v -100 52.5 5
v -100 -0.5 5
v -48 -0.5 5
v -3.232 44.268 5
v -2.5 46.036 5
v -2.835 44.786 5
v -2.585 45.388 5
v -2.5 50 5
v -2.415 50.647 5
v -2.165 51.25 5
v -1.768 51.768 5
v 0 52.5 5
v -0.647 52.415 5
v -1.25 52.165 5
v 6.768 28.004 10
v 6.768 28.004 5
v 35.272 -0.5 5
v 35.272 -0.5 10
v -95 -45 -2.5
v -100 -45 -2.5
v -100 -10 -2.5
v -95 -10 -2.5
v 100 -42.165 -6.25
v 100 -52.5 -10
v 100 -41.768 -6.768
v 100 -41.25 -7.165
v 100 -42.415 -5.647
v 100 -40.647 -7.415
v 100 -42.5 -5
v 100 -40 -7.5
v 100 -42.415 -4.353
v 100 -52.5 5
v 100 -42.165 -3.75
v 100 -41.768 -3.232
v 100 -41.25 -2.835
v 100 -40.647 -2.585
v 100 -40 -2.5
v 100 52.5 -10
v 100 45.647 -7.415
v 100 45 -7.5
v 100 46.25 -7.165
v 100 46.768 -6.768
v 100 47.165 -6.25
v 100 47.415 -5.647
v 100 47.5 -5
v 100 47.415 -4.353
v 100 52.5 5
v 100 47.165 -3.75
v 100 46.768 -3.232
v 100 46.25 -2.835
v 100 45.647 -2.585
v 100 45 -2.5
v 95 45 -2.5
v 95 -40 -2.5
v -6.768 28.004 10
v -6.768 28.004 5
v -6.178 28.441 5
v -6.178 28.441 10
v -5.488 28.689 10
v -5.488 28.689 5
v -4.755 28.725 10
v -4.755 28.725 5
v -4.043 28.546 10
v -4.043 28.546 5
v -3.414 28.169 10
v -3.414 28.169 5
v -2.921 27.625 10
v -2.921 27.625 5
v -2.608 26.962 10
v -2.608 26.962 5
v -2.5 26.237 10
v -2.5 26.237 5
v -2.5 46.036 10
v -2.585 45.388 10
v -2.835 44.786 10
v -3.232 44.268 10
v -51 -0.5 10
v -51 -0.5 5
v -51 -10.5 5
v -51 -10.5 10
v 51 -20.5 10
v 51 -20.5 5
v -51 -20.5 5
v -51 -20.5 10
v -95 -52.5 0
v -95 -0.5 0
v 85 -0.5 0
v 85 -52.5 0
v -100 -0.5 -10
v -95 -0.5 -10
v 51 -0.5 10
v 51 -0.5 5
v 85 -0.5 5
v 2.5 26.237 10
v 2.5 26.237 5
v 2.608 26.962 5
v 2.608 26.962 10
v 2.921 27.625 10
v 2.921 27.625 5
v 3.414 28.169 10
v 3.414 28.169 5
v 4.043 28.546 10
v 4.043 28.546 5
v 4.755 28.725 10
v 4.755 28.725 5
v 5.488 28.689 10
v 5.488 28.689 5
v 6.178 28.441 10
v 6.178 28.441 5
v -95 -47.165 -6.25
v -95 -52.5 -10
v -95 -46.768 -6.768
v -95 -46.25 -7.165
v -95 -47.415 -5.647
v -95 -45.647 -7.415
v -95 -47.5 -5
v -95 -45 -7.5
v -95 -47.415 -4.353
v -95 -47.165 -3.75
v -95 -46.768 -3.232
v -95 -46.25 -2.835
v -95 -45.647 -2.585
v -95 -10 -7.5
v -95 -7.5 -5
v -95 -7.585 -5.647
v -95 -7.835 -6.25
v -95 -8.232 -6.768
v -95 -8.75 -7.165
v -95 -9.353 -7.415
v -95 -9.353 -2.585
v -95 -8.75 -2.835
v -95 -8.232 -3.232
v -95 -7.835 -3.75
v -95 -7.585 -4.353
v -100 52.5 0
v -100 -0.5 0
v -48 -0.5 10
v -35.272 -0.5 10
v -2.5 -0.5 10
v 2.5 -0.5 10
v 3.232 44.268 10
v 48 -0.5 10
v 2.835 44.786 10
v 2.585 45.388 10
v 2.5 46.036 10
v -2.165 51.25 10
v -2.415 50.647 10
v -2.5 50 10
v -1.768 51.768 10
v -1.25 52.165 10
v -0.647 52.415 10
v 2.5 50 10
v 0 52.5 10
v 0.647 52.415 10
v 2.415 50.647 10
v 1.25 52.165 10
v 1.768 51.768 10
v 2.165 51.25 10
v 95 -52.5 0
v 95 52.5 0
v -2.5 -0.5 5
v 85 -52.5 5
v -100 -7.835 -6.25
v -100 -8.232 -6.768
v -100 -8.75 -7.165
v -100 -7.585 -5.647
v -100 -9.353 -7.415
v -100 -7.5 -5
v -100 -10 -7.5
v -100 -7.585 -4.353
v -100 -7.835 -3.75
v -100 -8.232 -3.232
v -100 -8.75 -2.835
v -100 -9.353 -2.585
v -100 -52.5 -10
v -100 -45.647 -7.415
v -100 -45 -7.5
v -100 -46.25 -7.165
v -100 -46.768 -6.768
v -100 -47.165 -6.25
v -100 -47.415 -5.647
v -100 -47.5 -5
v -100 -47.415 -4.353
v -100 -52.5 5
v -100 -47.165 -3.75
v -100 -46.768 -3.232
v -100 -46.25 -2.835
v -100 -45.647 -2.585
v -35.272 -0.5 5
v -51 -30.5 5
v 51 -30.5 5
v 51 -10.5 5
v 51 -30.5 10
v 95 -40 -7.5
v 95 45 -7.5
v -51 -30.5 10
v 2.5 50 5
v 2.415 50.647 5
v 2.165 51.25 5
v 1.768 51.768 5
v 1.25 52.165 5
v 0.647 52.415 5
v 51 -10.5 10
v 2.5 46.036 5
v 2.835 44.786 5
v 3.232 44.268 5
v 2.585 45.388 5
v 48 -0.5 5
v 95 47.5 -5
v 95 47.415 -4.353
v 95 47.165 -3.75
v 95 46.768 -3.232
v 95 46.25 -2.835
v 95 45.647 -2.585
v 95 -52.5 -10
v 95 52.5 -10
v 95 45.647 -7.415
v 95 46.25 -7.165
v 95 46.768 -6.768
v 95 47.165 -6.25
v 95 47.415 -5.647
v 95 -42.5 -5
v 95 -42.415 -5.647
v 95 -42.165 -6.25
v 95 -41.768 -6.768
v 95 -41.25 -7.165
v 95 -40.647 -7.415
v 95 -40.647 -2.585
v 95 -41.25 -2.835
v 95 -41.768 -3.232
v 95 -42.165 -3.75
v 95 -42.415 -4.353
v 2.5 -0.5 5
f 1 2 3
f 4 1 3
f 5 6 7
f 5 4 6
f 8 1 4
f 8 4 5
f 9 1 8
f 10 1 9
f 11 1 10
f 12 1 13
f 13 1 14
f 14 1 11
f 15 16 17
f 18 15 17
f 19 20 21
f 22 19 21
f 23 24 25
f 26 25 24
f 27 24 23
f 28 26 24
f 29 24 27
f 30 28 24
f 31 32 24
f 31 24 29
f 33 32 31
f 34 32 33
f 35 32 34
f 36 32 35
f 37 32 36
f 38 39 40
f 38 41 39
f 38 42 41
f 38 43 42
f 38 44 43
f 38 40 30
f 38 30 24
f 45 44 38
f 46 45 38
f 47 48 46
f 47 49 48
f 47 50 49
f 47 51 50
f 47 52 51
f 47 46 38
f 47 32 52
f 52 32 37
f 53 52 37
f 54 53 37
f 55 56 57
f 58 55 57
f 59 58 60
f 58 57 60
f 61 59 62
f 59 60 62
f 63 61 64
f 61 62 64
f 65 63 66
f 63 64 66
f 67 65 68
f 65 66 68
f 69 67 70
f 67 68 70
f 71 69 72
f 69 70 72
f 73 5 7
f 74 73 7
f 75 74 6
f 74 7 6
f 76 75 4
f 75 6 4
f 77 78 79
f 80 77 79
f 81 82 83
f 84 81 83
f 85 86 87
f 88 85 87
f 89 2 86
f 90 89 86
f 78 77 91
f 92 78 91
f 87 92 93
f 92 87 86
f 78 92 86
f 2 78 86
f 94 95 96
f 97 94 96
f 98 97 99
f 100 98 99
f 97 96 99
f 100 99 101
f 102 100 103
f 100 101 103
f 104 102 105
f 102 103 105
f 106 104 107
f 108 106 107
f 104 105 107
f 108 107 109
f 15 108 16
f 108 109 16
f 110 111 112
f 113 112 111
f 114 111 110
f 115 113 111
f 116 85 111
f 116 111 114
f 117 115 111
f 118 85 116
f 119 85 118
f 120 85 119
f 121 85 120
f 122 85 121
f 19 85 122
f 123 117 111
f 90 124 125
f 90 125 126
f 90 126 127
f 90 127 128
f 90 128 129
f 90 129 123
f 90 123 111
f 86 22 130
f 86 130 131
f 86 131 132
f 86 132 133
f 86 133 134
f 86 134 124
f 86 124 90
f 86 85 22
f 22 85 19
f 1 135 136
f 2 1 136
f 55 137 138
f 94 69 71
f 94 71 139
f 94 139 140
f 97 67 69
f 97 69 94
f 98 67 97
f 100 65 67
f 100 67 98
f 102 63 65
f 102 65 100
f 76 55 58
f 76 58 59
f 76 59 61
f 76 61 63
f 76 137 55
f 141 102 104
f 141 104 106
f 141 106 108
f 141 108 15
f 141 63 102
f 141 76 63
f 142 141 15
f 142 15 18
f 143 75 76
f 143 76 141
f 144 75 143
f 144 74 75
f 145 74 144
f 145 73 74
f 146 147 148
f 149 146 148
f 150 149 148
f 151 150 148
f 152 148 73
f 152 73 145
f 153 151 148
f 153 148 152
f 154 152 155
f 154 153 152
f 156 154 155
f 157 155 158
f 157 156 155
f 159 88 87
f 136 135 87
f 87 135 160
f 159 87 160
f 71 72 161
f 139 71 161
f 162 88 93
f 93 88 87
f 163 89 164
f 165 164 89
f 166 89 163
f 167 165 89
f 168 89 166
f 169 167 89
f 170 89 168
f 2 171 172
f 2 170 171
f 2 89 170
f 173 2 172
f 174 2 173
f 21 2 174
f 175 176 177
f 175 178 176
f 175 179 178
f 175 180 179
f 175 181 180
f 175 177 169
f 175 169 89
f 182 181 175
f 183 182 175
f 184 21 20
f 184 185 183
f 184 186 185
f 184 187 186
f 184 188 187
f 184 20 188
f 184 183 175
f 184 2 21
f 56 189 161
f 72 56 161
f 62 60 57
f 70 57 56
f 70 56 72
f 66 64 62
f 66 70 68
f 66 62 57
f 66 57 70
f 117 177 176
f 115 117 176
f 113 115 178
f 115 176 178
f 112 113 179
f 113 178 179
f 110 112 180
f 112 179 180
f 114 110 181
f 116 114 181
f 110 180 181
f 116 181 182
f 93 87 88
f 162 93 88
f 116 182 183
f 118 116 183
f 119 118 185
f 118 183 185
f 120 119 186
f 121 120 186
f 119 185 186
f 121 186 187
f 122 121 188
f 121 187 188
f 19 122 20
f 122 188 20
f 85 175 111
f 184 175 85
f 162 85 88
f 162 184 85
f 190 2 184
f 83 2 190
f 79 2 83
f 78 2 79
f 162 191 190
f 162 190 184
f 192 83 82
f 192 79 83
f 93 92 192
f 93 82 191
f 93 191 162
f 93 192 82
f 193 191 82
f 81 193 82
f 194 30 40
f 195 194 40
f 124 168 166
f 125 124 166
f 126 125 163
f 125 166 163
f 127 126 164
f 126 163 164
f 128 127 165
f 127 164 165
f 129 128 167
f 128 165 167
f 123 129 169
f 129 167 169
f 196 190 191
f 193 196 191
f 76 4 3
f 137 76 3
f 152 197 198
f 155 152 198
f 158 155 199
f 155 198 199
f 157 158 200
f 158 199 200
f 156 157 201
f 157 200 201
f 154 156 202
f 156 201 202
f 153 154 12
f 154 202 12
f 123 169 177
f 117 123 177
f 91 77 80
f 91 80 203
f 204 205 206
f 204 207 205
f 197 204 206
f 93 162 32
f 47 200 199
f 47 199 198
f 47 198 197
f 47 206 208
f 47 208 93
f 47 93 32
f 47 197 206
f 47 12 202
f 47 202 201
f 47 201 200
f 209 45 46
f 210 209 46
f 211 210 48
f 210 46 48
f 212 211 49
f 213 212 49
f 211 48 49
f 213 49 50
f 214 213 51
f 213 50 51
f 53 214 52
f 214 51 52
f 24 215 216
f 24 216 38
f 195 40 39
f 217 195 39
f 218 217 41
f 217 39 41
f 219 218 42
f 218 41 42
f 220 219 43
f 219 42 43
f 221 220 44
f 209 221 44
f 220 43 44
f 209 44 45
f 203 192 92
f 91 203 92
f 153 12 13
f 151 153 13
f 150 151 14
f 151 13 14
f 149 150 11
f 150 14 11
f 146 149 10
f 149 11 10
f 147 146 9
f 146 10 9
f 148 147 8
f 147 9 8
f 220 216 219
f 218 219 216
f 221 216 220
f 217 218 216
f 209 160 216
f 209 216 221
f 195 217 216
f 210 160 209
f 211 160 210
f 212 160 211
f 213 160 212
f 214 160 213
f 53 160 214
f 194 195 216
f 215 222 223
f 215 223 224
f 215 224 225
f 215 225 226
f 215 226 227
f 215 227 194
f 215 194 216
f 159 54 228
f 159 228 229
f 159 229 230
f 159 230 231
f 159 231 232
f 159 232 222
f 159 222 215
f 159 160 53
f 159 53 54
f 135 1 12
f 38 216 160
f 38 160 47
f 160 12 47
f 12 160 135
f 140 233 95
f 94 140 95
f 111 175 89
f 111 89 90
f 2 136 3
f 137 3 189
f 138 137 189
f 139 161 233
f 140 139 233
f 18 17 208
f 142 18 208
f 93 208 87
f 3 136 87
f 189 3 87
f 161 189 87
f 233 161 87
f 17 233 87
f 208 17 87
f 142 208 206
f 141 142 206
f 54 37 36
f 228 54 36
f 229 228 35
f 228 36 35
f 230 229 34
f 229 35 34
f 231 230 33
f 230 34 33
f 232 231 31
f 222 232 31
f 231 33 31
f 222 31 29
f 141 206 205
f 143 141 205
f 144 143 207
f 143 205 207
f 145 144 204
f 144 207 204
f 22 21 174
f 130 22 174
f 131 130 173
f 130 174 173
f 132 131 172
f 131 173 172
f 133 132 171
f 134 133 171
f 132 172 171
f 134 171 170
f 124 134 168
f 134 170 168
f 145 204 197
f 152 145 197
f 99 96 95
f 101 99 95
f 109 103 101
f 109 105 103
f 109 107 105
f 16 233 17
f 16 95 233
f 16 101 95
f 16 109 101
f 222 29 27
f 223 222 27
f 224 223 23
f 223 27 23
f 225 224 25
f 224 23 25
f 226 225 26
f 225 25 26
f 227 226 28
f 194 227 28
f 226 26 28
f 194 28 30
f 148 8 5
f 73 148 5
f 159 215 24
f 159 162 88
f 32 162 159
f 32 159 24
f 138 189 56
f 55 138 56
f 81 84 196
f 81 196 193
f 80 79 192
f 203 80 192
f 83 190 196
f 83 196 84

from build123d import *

# Parameters (mm, degrees)
F0_W      = 5
F0_H      = 53
F0_W_2    = 10
F0_H_2    = 10
F1_DEPTH  = 5
F2_DEPTH  = 10
F3_DEPTH  = 10
F0_W_3    = 48.5
F4_DEPTH  = 5
F5_DEPTH  = 10
F6_DEPTH  = 10
F8_DEPTH  = 25
F10_DEPTH = 25


with BuildPart() as f1:
    # F0 (on Top) → F1 (new body)
    with BuildSketch(Plane.XY):
        with Locations((97.5, 26)):
            Rectangle(F0_W, F0_H)
        with BuildLine():
            Line((0, 52.5), (-100, 52.5))
            Line((-100, 52.5), (-100, -0.5))
            Line((-100, -0.5), (-95, -0.5))
            Line((-95, -0.5), (-51, -0.5))
            Line((-51, -0.5), (-48, -0.5))
            Line((-48, -0.5), (-3.232233047, 44.267766953))
            ThreePointArc((-3.232233047, 44.267766953), (-2.6903011687, 45.078825325), (-2.5, 46.0355339059))
            Line((-2.5, 46.0355339059), (-2.5, 50))
            ThreePointArc((-2.5, 50), (-1.767766953, 51.767766953), (0, 52.5))
        make_face()
        with BuildLine():
            Line((85, 52.5), (0, 52.5))
            ThreePointArc((0, 52.5), (1.767766953, 51.767766953), (2.5, 50))
            Line((2.5, 50), (2.5, 46.0355339059))
            ThreePointArc((2.5, 46.0355339059), (2.6903011687, 45.078825325), (3.232233047, 44.267766953))
            Line((3.232233047, 44.267766953), (48, -0.5))
            Line((48, -0.5), (51, -0.5))
            Line((51, -0.5), (85, -0.5))
            Line((85, -0.5), (85, 52.5))
        make_face()
        with BuildLine():
            ThreePointArc((2.5, 50), (1.767766953, 51.767766953), (0, 52.5))
            ThreePointArc((0, 52.5), (-1.767766953, 51.767766953), (-2.5, 50))
            Line((-2.5, 50), (-2.5, 46.0355339059))
            Line((-2.5, 46.0355339059), (-2.5, 32.2720779386))
            Line((-2.5, 32.2720779386), (-2.5, 26.2365440327))
            Line((-2.5, 26.2365440327), (-2.5, 0))
            Line((-2.5, 0), (-2.5, -0.5))
            Line((-2.5, -0.5), (2.5, -0.5))
            Line((2.5, -0.5), (2.5, 26.2365440327))
            Line((2.5, 26.2365440327), (2.5, 46.0355339059))
            Line((2.5, 46.0355339059), (2.5, 50))
        make_face()
        with BuildLine():
            Line((-2.5, 32.2720779386), (-2.5, 46.0355339059))
            ThreePointArc((-2.5, 46.0355339059), (-2.6903011687, 45.078825325), (-3.232233047, 44.267766953))
            Line((-3.232233047, 44.267766953), (-48, -0.5))
            Line((-48, -0.5), (-35.2720779386, -0.5))
            Line((-35.2720779386, -0.5), (-6.767766953, 28.0043109857))
            ThreePointArc((-6.767766953, 28.0043109857), (-4.0432914191, 28.546242864), (-2.5, 26.2365440327))
            Line((-2.5, 26.2365440327), (-2.5, 32.2720779386))
        make_face()
        with BuildLine():
            Line((-2.5, 0), (-2.5, 26.2365440327))
            ThreePointArc((-2.5, 26.2365440327), (-4.0432914191, 28.546242864), (-6.767766953, 28.0043109857))
            Line((-6.767766953, 28.0043109857), (-35.2720779386, -0.5))
            Line((-35.2720779386, -0.5), (-2.5, -0.5))
            Line((-2.5, -0.5), (-2.5, 0))
        make_face()
        with BuildLine():
            ThreePointArc((6.767766953, 28.0043109857), (4.0432914191, 28.546242864), (2.5, 26.2365440327))
            Line((2.5, 26.2365440327), (2.5, -0.5))
            Line((2.5, -0.5), (35.2720779386, -0.5))
            Line((35.2720779386, -0.5), (6.767766953, 28.0043109857))
        make_face()
        with BuildLine():
            ThreePointArc((3.232233047, 44.267766953), (2.6903011687, 45.078825325), (2.5, 46.0355339059))
            Line((2.5, 46.0355339059), (2.5, 26.2365440327))
            ThreePointArc((2.5, 26.2365440327), (4.0432914191, 28.546242864), (6.767766953, 28.0043109857))
            Line((6.767766953, 28.0043109857), (35.2720779386, -0.5))
            Line((35.2720779386, -0.5), (48, -0.5))
            Line((48, -0.5), (3.232233047, 44.267766953))
        make_face()
        with Locations((90, 26)):
            Rectangle(F0_W_2, F0_H)
        with Locations((90, -5.5)):
            Rectangle(F0_W_2, F0_H_2)
        with Locations((90, -15.5)):
            Rectangle(F0_W_2, F0_H_2)
        with Locations((90, -25.5)):
            Rectangle(F0_W_2, F0_H_2)
        with Locations((97.5, -25.5)):
            Rectangle(F0_W, F0_H_2)
        with Locations((97.5, -15.5)):
            Rectangle(F0_W, F0_H_2)
        with Locations((97.5, -5.5)):
            Rectangle(F0_W, F0_H_2)
        Polygon((95, -30.5), (85, -30.5), (85, -37.5), (95, -47.5), align=None)
        with BuildLine():
            Line((100, -30.5), (95, -30.5))
            Line((95, -30.5), (95, -47.5))
            Line((95, -47.5), (95.732233047, -48.232233047))
            ThreePointArc((95.732233047, -48.232233047), (96.4244505146, -50.4455071839), (95, -52.2754493028))
            Line((95, -52.2754493028), (95, -52.5))
            Line((95, -52.5), (100, -52.5))
            Line((100, -52.5), (100, -30.5))
        make_face()
        with BuildLine():
            Line((95, -47.5), (85, -37.5))
            Line((85, -37.5), (85, -50.2279220614))
            Line((85, -50.2279220614), (86.5398448916, -51.767766953))
            ThreePointArc((86.5398448916, -51.767766953), (87.3509032637, -52.3096988313), (88.3076118446, -52.5))
            Line((88.3076118446, -52.5), (93.9644660941, -52.5))
            ThreePointArc((93.9644660941, -52.5), (94.4942664069, -52.4432174747), (95, -52.2754493028))
            Line((95, -52.2754493028), (95, -47.5))
        make_face()
        with BuildLine():
            Line((86.5398448916, -51.767766953), (85, -50.2279220614))
            Line((85, -50.2279220614), (85, -52.5))
            Line((85, -52.5), (88.3076118446, -52.5))
            ThreePointArc((88.3076118446, -52.5), (87.3509032637, -52.3096988313), (86.5398448916, -51.767766953))
        make_face()
        with BuildLine():
            Line((95.732233047, -48.232233047), (95, -47.5))
            Line((95, -47.5), (95, -52.2754493028))
            ThreePointArc((95, -52.2754493028), (96.4244505146, -50.4455071839), (95.732233047, -48.232233047))
        make_face()
        with BuildLine():
            Line((95, -52.5), (95, -52.2754493028))
            ThreePointArc((95, -52.2754493028), (94.4942664069, -52.4432174747), (93.9644660941, -52.5))
            Line((93.9644660941, -52.5), (95, -52.5))
        make_face()
    extrude(amount=F1_DEPTH)

    # F0 (on Top) → F2 (join)
    with BuildSketch(Plane.XY):
        with BuildLine():
            ThreePointArc((2.5, 50), (1.767766953, 51.767766953), (0, 52.5))
            ThreePointArc((0, 52.5), (-1.767766953, 51.767766953), (-2.5, 50))
            Line((-2.5, 50), (-2.5, 46.0355339059))
            Line((-2.5, 46.0355339059), (-2.5, 32.2720779386))
            Line((-2.5, 32.2720779386), (-2.5, 26.2365440327))
            Line((-2.5, 26.2365440327), (-2.5, 0))
            Line((-2.5, 0), (-2.5, -0.5))
            Line((-2.5, -0.5), (2.5, -0.5))
            Line((2.5, -0.5), (2.5, 26.2365440327))
            Line((2.5, 26.2365440327), (2.5, 46.0355339059))
            Line((2.5, 46.0355339059), (2.5, 50))
        make_face()
        with BuildLine():
            Line((-2.5, 32.2720779386), (-2.5, 46.0355339059))
            ThreePointArc((-2.5, 46.0355339059), (-2.6903011687, 45.078825325), (-3.232233047, 44.267766953))
            Line((-3.232233047, 44.267766953), (-48, -0.5))
            Line((-48, -0.5), (-35.2720779386, -0.5))
            Line((-35.2720779386, -0.5), (-6.767766953, 28.0043109857))
            ThreePointArc((-6.767766953, 28.0043109857), (-4.0432914191, 28.546242864), (-2.5, 26.2365440327))
            Line((-2.5, 26.2365440327), (-2.5, 32.2720779386))
        make_face()
        with BuildLine():
            ThreePointArc((3.232233047, 44.267766953), (2.6903011687, 45.078825325), (2.5, 46.0355339059))
            Line((2.5, 46.0355339059), (2.5, 26.2365440327))
            ThreePointArc((2.5, 26.2365440327), (4.0432914191, 28.546242864), (6.767766953, 28.0043109857))
            Line((6.767766953, 28.0043109857), (35.2720779386, -0.5))
            Line((35.2720779386, -0.5), (48, -0.5))
            Line((48, -0.5), (3.232233047, 44.267766953))
        make_face()
    extrude(amount=F2_DEPTH)

    # F0 (on Top) → F3 (join)
    with BuildSketch(Plane.XY):
        with Locations((97.5, 26)):
            Rectangle(F0_W, F0_H)
        with Locations((97.5, -5.5)):
            Rectangle(F0_W, F0_H_2)
        with Locations((97.5, -15.5)):
            Rectangle(F0_W, F0_H_2)
        with Locations((97.5, -25.5)):
            Rectangle(F0_W, F0_H_2)
        with BuildLine():
            Line((100, -30.5), (95, -30.5))
            Line((95, -30.5), (95, -47.5))
            Line((95, -47.5), (95.732233047, -48.232233047))
            ThreePointArc((95.732233047, -48.232233047), (96.4244505146, -50.4455071839), (95, -52.2754493028))
            Line((95, -52.2754493028), (95, -52.5))
            Line((95, -52.5), (100, -52.5))
            Line((100, -52.5), (100, -30.5))
        make_face()
        with BuildLine():
            Line((95.732233047, -48.232233047), (95, -47.5))
            Line((95, -47.5), (95, -52.2754493028))
            ThreePointArc((95, -52.2754493028), (96.4244505146, -50.4455071839), (95.732233047, -48.232233047))
        make_face()
    extrude(amount=-F3_DEPTH)

    # F7 (on face) → F8 (cut)
    with BuildSketch(Plane.YZ.offset(100)):
        with BuildLine():
            Line((45, -2.5), (-40, -2.5))
            ThreePointArc((-40, -2.5), (-41.767766953, -3.232233047), (-42.5, -5))
            ThreePointArc((-42.5, -5), (-41.767766953, -6.767766953), (-40, -7.5))
            Line((-40, -7.5), (45, -7.5))
            ThreePointArc((45, -7.5), (46.767766953, -6.767766953), (47.5, -5))
            ThreePointArc((47.5, -5), (46.767766953, -3.232233047), (45, -2.5))
        make_face()
    extrude(amount=-F8_DEPTH, mode=Mode.SUBTRACT)


with BuildPart() as f4:
    # F0 (on Top) → F4 (new body)
    with BuildSketch(Plane.XY):
        with Locations((-97.5, -25.5)):
            Rectangle(F0_W, F0_H_2)
        Polygon((-68, -20.5), (-95, -20.5), (-95, -30.5), (-78, -30.5), align=None)
        with Locations((-97.5, -15.5)):
            Rectangle(F0_W, F0_H_2)
        with Locations((-97.5, -5.5)):
            Rectangle(F0_W, F0_H_2)
        Polygon((-51, -0.5), (-95, -0.5), (-95, -10.5), (-58, -10.5), (-51, -3.5), align=None)
        Polygon((-58, -10.5), (-95, -10.5), (-95, -20.5), (-68, -20.5), align=None)
        Polygon((-55.2720779386, -20.5), (-68, -20.5), (-78, -30.5), (-65.2720779386, -30.5), align=None)
        Polygon((-51, -10.5), (-58, -10.5), (-68, -20.5), (-55.2720779386, -20.5), (-45.2720779386, -10.5), align=None)
        Polygon((-35.2720779386, -0.5), (-48, -0.5), (-51, -3.5), (-51, -10.5), (-45.2720779386, -10.5), align=None)
        Polygon((-51, -3.5), (-58, -10.5), (-51, -10.5), align=None)
        Polygon((-48, -0.5), (-51, -0.5), (-51, -3.5), align=None)
        Polygon((-2.5, -0.5), (-35.2720779386, -0.5), (-45.2720779386, -10.5), (-2.5, -10.5), align=None)
        Polygon((-45.2720779386, -10.5), (-55.2720779386, -20.5), (-51, -20.5), (-2.5, -20.5), (-2.5, -10.5), align=None)
        Polygon((-51, -20.5), (-55.2720779386, -20.5), (-65.2720779386, -30.5), (-51, -30.5), align=None)
        with Locations((-26.75, -25.5)):
            Rectangle(F0_W_3, F0_H_2)
        with Locations((0, -5.5)):
            Rectangle(F0_W, F0_H_2)
        with Locations((0, -15.5)):
            Rectangle(F0_W, F0_H_2)
        with Locations((0, -25.5)):
            Rectangle(F0_W, F0_H_2)
        Polygon((45.2720779386, -10.5), (2.5, -10.5), (2.5, -20.5), (51, -20.5), (55.2720779386, -20.5), align=None)
        Polygon((35.2720779386, -0.5), (2.5, -0.5), (2.5, -10.5), (45.2720779386, -10.5), align=None)
        Polygon((65.2720779386, -30.5), (55.2720779386, -20.5), (51, -20.5), (51, -30.5), align=None)
        Polygon((78, -30.5), (68, -20.5), (55.2720779386, -20.5), (65.2720779386, -30.5), align=None)
        Polygon((68, -20.5), (58, -10.5), (51, -10.5), (45.2720779386, -10.5), (55.2720779386, -20.5), align=None)
        with Locations((26.75, -25.5)):
            Rectangle(F0_W_3, F0_H_2)
        Polygon((51, -3.5), (48, -0.5), (35.2720779386, -0.5), (45.2720779386, -10.5), (51, -10.5), align=None)
        Polygon((51, -3.5), (51, -0.5), (48, -0.5), align=None)
        Polygon((58, -10.5), (51, -3.5), (51, -10.5), align=None)
        Polygon((85, -30.5), (85, -20.5), (68, -20.5), (78, -30.5), align=None)
        Polygon((85, -20.5), (85, -10.5), (58, -10.5), (68, -20.5), align=None)
        Polygon((85, -10.5), (85, -0.5), (51, -0.5), (51, -3.5), (58, -10.5), align=None)
        Polygon((85, -37.5), (85, -30.5), (78, -30.5), align=None)
        Polygon((85, -37.5), (78, -30.5), (65.2720779386, -30.5), (85, -50.2279220614), align=None)
        with BuildLine():
            Line((85, -50.2279220614), (65.2720779386, -30.5))
            Line((65.2720779386, -30.5), (51, -30.5))
            Line((51, -30.5), (2.5, -30.5))
            Line((2.5, -30.5), (2.5, -50))
            ThreePointArc((2.5, -50), (1.767766953, -51.767766953), (0, -52.5))
            Line((0, -52.5), (85, -52.5))
            Line((85, -52.5), (85, -50.2279220614))
        make_face()
        with BuildLine():
            Line((2.5, -50), (2.5, -30.5))
            Line((2.5, -30.5), (-2.5, -30.5))
            Line((-2.5, -30.5), (-2.5, -50))
            ThreePointArc((-2.5, -50), (-1.767766953, -51.767766953), (0, -52.5))
            ThreePointArc((0, -52.5), (1.767766953, -51.767766953), (2.5, -50))
        make_face()
        with BuildLine():
            Line((-51, -30.5), (-65.2720779386, -30.5))
            Line((-65.2720779386, -30.5), (-86.5398448916, -51.767766953))
            ThreePointArc((-86.5398448916, -51.767766953), (-87.3509032637, -52.3096988313), (-88.3076118446, -52.5))
            Line((-88.3076118446, -52.5), (0, -52.5))
            ThreePointArc((0, -52.5), (-1.767766953, -51.767766953), (-2.5, -50))
            Line((-2.5, -50), (-2.5, -30.5))
            Line((-2.5, -30.5), (-51, -30.5))
        make_face()
        with BuildLine():
            Line((-65.2720779386, -30.5), (-78, -30.5))
            Line((-78, -30.5), (-95, -47.5))
            Line((-95, -47.5), (-95, -52.2754493028))
            ThreePointArc((-95, -52.2754493028), (-94.4942664069, -52.4432174747), (-93.9644660941, -52.5))
            Line((-93.9644660941, -52.5), (-88.3076118446, -52.5))
            ThreePointArc((-88.3076118446, -52.5), (-87.3509032637, -52.3096988313), (-86.5398448916, -51.767766953))
            Line((-86.5398448916, -51.767766953), (-65.2720779386, -30.5))
        make_face()
        with BuildLine():
            Line((-95, -30.5), (-100, -30.5))
            Line((-100, -30.5), (-100, -52.5))
            Line((-100, -52.5), (-95, -52.5))
            Line((-95, -52.5), (-95, -52.2754493028))
            ThreePointArc((-95, -52.2754493028), (-96.4244505146, -50.4455071839), (-95.732233047, -48.232233047))
            Line((-95.732233047, -48.232233047), (-95, -47.5))
            Line((-95, -47.5), (-95, -30.5))
        make_face()
        with BuildLine():
            Line((-95, -52.2754493028), (-95, -52.5))
            Line((-95, -52.5), (-93.9644660941, -52.5))
            ThreePointArc((-93.9644660941, -52.5), (-94.4942664069, -52.4432174747), (-95, -52.2754493028))
        make_face()
        Polygon((-78, -30.5), (-95, -30.5), (-95, -47.5), align=None)
        with BuildLine():
            Line((-95, -52.2754493028), (-95, -47.5))
            Line((-95, -47.5), (-95.732233047, -48.232233047))
            ThreePointArc((-95.732233047, -48.232233047), (-96.4244505146, -50.4455071839), (-95, -52.2754493028))
        make_face()
    extrude(amount=F4_DEPTH)

    # F0 (on Top) → F5 (join)
    with BuildSketch(Plane.XY):
        with Locations((-97.5, -5.5)):
            Rectangle(F0_W, F0_H_2)
        with Locations((-97.5, -15.5)):
            Rectangle(F0_W, F0_H_2)
        with Locations((-97.5, -25.5)):
            Rectangle(F0_W, F0_H_2)
        with BuildLine():
            Line((-95, -30.5), (-100, -30.5))
            Line((-100, -30.5), (-100, -52.5))
            Line((-100, -52.5), (-95, -52.5))
            Line((-95, -52.5), (-95, -52.2754493028))
            ThreePointArc((-95, -52.2754493028), (-96.4244505146, -50.4455071839), (-95.732233047, -48.232233047))
            Line((-95.732233047, -48.232233047), (-95, -47.5))
            Line((-95, -47.5), (-95, -30.5))
        make_face()
        with BuildLine():
            Line((-95, -52.2754493028), (-95, -47.5))
            Line((-95, -47.5), (-95.732233047, -48.232233047))
            ThreePointArc((-95.732233047, -48.232233047), (-96.4244505146, -50.4455071839), (-95, -52.2754493028))
        make_face()
    extrude(amount=-F5_DEPTH)

    # F0 (on Top) → F6 (join)
    with BuildSketch(Plane.XY):
        Polygon((-2.5, -0.5), (-35.2720779386, -0.5), (-45.2720779386, -10.5), (-2.5, -10.5), align=None)
        Polygon((-35.2720779386, -0.5), (-48, -0.5), (-51, -3.5), (-51, -10.5), (-45.2720779386, -10.5), align=None)
        Polygon((-48, -0.5), (-51, -0.5), (-51, -3.5), align=None)
        with Locations((-26.75, -25.5)):
            Rectangle(F0_W_3, F0_H_2)
        with Locations((26.75, -25.5)):
            Rectangle(F0_W_3, F0_H_2)
        with Locations((0, -25.5)):
            Rectangle(F0_W, F0_H_2)
        Polygon((35.2720779386, -0.5), (2.5, -0.5), (2.5, -10.5), (45.2720779386, -10.5), align=None)
        with Locations((0, -5.5)):
            Rectangle(F0_W, F0_H_2)
        Polygon((51, -3.5), (48, -0.5), (35.2720779386, -0.5), (45.2720779386, -10.5), (51, -10.5), align=None)
        Polygon((51, -3.5), (51, -0.5), (48, -0.5), align=None)
    extrude(amount=F6_DEPTH)

    # F9 (on face) → F10 (cut)
    with BuildSketch(Plane(origin=(-100, 0, 0), x_dir=(0, -1, 0), z_dir=(-1, 0, 0))):
        with BuildLine():
            Line((45, -2.5), (10, -2.5))
            ThreePointArc((10, -2.5), (8.232233047, -3.232233047), (7.5, -5))
            ThreePointArc((7.5, -5), (8.232233047, -6.767766953), (10, -7.5))
            Line((10, -7.5), (45, -7.5))
            ThreePointArc((45, -7.5), (46.767766953, -6.767766953), (47.5, -5))
            ThreePointArc((47.5, -5), (46.767766953, -3.232233047), (45, -2.5))
        make_face()
    extrude(amount=-F10_DEPTH, mode=Mode.SUBTRACT)


solid = Compound([f1.part, f4.part])
